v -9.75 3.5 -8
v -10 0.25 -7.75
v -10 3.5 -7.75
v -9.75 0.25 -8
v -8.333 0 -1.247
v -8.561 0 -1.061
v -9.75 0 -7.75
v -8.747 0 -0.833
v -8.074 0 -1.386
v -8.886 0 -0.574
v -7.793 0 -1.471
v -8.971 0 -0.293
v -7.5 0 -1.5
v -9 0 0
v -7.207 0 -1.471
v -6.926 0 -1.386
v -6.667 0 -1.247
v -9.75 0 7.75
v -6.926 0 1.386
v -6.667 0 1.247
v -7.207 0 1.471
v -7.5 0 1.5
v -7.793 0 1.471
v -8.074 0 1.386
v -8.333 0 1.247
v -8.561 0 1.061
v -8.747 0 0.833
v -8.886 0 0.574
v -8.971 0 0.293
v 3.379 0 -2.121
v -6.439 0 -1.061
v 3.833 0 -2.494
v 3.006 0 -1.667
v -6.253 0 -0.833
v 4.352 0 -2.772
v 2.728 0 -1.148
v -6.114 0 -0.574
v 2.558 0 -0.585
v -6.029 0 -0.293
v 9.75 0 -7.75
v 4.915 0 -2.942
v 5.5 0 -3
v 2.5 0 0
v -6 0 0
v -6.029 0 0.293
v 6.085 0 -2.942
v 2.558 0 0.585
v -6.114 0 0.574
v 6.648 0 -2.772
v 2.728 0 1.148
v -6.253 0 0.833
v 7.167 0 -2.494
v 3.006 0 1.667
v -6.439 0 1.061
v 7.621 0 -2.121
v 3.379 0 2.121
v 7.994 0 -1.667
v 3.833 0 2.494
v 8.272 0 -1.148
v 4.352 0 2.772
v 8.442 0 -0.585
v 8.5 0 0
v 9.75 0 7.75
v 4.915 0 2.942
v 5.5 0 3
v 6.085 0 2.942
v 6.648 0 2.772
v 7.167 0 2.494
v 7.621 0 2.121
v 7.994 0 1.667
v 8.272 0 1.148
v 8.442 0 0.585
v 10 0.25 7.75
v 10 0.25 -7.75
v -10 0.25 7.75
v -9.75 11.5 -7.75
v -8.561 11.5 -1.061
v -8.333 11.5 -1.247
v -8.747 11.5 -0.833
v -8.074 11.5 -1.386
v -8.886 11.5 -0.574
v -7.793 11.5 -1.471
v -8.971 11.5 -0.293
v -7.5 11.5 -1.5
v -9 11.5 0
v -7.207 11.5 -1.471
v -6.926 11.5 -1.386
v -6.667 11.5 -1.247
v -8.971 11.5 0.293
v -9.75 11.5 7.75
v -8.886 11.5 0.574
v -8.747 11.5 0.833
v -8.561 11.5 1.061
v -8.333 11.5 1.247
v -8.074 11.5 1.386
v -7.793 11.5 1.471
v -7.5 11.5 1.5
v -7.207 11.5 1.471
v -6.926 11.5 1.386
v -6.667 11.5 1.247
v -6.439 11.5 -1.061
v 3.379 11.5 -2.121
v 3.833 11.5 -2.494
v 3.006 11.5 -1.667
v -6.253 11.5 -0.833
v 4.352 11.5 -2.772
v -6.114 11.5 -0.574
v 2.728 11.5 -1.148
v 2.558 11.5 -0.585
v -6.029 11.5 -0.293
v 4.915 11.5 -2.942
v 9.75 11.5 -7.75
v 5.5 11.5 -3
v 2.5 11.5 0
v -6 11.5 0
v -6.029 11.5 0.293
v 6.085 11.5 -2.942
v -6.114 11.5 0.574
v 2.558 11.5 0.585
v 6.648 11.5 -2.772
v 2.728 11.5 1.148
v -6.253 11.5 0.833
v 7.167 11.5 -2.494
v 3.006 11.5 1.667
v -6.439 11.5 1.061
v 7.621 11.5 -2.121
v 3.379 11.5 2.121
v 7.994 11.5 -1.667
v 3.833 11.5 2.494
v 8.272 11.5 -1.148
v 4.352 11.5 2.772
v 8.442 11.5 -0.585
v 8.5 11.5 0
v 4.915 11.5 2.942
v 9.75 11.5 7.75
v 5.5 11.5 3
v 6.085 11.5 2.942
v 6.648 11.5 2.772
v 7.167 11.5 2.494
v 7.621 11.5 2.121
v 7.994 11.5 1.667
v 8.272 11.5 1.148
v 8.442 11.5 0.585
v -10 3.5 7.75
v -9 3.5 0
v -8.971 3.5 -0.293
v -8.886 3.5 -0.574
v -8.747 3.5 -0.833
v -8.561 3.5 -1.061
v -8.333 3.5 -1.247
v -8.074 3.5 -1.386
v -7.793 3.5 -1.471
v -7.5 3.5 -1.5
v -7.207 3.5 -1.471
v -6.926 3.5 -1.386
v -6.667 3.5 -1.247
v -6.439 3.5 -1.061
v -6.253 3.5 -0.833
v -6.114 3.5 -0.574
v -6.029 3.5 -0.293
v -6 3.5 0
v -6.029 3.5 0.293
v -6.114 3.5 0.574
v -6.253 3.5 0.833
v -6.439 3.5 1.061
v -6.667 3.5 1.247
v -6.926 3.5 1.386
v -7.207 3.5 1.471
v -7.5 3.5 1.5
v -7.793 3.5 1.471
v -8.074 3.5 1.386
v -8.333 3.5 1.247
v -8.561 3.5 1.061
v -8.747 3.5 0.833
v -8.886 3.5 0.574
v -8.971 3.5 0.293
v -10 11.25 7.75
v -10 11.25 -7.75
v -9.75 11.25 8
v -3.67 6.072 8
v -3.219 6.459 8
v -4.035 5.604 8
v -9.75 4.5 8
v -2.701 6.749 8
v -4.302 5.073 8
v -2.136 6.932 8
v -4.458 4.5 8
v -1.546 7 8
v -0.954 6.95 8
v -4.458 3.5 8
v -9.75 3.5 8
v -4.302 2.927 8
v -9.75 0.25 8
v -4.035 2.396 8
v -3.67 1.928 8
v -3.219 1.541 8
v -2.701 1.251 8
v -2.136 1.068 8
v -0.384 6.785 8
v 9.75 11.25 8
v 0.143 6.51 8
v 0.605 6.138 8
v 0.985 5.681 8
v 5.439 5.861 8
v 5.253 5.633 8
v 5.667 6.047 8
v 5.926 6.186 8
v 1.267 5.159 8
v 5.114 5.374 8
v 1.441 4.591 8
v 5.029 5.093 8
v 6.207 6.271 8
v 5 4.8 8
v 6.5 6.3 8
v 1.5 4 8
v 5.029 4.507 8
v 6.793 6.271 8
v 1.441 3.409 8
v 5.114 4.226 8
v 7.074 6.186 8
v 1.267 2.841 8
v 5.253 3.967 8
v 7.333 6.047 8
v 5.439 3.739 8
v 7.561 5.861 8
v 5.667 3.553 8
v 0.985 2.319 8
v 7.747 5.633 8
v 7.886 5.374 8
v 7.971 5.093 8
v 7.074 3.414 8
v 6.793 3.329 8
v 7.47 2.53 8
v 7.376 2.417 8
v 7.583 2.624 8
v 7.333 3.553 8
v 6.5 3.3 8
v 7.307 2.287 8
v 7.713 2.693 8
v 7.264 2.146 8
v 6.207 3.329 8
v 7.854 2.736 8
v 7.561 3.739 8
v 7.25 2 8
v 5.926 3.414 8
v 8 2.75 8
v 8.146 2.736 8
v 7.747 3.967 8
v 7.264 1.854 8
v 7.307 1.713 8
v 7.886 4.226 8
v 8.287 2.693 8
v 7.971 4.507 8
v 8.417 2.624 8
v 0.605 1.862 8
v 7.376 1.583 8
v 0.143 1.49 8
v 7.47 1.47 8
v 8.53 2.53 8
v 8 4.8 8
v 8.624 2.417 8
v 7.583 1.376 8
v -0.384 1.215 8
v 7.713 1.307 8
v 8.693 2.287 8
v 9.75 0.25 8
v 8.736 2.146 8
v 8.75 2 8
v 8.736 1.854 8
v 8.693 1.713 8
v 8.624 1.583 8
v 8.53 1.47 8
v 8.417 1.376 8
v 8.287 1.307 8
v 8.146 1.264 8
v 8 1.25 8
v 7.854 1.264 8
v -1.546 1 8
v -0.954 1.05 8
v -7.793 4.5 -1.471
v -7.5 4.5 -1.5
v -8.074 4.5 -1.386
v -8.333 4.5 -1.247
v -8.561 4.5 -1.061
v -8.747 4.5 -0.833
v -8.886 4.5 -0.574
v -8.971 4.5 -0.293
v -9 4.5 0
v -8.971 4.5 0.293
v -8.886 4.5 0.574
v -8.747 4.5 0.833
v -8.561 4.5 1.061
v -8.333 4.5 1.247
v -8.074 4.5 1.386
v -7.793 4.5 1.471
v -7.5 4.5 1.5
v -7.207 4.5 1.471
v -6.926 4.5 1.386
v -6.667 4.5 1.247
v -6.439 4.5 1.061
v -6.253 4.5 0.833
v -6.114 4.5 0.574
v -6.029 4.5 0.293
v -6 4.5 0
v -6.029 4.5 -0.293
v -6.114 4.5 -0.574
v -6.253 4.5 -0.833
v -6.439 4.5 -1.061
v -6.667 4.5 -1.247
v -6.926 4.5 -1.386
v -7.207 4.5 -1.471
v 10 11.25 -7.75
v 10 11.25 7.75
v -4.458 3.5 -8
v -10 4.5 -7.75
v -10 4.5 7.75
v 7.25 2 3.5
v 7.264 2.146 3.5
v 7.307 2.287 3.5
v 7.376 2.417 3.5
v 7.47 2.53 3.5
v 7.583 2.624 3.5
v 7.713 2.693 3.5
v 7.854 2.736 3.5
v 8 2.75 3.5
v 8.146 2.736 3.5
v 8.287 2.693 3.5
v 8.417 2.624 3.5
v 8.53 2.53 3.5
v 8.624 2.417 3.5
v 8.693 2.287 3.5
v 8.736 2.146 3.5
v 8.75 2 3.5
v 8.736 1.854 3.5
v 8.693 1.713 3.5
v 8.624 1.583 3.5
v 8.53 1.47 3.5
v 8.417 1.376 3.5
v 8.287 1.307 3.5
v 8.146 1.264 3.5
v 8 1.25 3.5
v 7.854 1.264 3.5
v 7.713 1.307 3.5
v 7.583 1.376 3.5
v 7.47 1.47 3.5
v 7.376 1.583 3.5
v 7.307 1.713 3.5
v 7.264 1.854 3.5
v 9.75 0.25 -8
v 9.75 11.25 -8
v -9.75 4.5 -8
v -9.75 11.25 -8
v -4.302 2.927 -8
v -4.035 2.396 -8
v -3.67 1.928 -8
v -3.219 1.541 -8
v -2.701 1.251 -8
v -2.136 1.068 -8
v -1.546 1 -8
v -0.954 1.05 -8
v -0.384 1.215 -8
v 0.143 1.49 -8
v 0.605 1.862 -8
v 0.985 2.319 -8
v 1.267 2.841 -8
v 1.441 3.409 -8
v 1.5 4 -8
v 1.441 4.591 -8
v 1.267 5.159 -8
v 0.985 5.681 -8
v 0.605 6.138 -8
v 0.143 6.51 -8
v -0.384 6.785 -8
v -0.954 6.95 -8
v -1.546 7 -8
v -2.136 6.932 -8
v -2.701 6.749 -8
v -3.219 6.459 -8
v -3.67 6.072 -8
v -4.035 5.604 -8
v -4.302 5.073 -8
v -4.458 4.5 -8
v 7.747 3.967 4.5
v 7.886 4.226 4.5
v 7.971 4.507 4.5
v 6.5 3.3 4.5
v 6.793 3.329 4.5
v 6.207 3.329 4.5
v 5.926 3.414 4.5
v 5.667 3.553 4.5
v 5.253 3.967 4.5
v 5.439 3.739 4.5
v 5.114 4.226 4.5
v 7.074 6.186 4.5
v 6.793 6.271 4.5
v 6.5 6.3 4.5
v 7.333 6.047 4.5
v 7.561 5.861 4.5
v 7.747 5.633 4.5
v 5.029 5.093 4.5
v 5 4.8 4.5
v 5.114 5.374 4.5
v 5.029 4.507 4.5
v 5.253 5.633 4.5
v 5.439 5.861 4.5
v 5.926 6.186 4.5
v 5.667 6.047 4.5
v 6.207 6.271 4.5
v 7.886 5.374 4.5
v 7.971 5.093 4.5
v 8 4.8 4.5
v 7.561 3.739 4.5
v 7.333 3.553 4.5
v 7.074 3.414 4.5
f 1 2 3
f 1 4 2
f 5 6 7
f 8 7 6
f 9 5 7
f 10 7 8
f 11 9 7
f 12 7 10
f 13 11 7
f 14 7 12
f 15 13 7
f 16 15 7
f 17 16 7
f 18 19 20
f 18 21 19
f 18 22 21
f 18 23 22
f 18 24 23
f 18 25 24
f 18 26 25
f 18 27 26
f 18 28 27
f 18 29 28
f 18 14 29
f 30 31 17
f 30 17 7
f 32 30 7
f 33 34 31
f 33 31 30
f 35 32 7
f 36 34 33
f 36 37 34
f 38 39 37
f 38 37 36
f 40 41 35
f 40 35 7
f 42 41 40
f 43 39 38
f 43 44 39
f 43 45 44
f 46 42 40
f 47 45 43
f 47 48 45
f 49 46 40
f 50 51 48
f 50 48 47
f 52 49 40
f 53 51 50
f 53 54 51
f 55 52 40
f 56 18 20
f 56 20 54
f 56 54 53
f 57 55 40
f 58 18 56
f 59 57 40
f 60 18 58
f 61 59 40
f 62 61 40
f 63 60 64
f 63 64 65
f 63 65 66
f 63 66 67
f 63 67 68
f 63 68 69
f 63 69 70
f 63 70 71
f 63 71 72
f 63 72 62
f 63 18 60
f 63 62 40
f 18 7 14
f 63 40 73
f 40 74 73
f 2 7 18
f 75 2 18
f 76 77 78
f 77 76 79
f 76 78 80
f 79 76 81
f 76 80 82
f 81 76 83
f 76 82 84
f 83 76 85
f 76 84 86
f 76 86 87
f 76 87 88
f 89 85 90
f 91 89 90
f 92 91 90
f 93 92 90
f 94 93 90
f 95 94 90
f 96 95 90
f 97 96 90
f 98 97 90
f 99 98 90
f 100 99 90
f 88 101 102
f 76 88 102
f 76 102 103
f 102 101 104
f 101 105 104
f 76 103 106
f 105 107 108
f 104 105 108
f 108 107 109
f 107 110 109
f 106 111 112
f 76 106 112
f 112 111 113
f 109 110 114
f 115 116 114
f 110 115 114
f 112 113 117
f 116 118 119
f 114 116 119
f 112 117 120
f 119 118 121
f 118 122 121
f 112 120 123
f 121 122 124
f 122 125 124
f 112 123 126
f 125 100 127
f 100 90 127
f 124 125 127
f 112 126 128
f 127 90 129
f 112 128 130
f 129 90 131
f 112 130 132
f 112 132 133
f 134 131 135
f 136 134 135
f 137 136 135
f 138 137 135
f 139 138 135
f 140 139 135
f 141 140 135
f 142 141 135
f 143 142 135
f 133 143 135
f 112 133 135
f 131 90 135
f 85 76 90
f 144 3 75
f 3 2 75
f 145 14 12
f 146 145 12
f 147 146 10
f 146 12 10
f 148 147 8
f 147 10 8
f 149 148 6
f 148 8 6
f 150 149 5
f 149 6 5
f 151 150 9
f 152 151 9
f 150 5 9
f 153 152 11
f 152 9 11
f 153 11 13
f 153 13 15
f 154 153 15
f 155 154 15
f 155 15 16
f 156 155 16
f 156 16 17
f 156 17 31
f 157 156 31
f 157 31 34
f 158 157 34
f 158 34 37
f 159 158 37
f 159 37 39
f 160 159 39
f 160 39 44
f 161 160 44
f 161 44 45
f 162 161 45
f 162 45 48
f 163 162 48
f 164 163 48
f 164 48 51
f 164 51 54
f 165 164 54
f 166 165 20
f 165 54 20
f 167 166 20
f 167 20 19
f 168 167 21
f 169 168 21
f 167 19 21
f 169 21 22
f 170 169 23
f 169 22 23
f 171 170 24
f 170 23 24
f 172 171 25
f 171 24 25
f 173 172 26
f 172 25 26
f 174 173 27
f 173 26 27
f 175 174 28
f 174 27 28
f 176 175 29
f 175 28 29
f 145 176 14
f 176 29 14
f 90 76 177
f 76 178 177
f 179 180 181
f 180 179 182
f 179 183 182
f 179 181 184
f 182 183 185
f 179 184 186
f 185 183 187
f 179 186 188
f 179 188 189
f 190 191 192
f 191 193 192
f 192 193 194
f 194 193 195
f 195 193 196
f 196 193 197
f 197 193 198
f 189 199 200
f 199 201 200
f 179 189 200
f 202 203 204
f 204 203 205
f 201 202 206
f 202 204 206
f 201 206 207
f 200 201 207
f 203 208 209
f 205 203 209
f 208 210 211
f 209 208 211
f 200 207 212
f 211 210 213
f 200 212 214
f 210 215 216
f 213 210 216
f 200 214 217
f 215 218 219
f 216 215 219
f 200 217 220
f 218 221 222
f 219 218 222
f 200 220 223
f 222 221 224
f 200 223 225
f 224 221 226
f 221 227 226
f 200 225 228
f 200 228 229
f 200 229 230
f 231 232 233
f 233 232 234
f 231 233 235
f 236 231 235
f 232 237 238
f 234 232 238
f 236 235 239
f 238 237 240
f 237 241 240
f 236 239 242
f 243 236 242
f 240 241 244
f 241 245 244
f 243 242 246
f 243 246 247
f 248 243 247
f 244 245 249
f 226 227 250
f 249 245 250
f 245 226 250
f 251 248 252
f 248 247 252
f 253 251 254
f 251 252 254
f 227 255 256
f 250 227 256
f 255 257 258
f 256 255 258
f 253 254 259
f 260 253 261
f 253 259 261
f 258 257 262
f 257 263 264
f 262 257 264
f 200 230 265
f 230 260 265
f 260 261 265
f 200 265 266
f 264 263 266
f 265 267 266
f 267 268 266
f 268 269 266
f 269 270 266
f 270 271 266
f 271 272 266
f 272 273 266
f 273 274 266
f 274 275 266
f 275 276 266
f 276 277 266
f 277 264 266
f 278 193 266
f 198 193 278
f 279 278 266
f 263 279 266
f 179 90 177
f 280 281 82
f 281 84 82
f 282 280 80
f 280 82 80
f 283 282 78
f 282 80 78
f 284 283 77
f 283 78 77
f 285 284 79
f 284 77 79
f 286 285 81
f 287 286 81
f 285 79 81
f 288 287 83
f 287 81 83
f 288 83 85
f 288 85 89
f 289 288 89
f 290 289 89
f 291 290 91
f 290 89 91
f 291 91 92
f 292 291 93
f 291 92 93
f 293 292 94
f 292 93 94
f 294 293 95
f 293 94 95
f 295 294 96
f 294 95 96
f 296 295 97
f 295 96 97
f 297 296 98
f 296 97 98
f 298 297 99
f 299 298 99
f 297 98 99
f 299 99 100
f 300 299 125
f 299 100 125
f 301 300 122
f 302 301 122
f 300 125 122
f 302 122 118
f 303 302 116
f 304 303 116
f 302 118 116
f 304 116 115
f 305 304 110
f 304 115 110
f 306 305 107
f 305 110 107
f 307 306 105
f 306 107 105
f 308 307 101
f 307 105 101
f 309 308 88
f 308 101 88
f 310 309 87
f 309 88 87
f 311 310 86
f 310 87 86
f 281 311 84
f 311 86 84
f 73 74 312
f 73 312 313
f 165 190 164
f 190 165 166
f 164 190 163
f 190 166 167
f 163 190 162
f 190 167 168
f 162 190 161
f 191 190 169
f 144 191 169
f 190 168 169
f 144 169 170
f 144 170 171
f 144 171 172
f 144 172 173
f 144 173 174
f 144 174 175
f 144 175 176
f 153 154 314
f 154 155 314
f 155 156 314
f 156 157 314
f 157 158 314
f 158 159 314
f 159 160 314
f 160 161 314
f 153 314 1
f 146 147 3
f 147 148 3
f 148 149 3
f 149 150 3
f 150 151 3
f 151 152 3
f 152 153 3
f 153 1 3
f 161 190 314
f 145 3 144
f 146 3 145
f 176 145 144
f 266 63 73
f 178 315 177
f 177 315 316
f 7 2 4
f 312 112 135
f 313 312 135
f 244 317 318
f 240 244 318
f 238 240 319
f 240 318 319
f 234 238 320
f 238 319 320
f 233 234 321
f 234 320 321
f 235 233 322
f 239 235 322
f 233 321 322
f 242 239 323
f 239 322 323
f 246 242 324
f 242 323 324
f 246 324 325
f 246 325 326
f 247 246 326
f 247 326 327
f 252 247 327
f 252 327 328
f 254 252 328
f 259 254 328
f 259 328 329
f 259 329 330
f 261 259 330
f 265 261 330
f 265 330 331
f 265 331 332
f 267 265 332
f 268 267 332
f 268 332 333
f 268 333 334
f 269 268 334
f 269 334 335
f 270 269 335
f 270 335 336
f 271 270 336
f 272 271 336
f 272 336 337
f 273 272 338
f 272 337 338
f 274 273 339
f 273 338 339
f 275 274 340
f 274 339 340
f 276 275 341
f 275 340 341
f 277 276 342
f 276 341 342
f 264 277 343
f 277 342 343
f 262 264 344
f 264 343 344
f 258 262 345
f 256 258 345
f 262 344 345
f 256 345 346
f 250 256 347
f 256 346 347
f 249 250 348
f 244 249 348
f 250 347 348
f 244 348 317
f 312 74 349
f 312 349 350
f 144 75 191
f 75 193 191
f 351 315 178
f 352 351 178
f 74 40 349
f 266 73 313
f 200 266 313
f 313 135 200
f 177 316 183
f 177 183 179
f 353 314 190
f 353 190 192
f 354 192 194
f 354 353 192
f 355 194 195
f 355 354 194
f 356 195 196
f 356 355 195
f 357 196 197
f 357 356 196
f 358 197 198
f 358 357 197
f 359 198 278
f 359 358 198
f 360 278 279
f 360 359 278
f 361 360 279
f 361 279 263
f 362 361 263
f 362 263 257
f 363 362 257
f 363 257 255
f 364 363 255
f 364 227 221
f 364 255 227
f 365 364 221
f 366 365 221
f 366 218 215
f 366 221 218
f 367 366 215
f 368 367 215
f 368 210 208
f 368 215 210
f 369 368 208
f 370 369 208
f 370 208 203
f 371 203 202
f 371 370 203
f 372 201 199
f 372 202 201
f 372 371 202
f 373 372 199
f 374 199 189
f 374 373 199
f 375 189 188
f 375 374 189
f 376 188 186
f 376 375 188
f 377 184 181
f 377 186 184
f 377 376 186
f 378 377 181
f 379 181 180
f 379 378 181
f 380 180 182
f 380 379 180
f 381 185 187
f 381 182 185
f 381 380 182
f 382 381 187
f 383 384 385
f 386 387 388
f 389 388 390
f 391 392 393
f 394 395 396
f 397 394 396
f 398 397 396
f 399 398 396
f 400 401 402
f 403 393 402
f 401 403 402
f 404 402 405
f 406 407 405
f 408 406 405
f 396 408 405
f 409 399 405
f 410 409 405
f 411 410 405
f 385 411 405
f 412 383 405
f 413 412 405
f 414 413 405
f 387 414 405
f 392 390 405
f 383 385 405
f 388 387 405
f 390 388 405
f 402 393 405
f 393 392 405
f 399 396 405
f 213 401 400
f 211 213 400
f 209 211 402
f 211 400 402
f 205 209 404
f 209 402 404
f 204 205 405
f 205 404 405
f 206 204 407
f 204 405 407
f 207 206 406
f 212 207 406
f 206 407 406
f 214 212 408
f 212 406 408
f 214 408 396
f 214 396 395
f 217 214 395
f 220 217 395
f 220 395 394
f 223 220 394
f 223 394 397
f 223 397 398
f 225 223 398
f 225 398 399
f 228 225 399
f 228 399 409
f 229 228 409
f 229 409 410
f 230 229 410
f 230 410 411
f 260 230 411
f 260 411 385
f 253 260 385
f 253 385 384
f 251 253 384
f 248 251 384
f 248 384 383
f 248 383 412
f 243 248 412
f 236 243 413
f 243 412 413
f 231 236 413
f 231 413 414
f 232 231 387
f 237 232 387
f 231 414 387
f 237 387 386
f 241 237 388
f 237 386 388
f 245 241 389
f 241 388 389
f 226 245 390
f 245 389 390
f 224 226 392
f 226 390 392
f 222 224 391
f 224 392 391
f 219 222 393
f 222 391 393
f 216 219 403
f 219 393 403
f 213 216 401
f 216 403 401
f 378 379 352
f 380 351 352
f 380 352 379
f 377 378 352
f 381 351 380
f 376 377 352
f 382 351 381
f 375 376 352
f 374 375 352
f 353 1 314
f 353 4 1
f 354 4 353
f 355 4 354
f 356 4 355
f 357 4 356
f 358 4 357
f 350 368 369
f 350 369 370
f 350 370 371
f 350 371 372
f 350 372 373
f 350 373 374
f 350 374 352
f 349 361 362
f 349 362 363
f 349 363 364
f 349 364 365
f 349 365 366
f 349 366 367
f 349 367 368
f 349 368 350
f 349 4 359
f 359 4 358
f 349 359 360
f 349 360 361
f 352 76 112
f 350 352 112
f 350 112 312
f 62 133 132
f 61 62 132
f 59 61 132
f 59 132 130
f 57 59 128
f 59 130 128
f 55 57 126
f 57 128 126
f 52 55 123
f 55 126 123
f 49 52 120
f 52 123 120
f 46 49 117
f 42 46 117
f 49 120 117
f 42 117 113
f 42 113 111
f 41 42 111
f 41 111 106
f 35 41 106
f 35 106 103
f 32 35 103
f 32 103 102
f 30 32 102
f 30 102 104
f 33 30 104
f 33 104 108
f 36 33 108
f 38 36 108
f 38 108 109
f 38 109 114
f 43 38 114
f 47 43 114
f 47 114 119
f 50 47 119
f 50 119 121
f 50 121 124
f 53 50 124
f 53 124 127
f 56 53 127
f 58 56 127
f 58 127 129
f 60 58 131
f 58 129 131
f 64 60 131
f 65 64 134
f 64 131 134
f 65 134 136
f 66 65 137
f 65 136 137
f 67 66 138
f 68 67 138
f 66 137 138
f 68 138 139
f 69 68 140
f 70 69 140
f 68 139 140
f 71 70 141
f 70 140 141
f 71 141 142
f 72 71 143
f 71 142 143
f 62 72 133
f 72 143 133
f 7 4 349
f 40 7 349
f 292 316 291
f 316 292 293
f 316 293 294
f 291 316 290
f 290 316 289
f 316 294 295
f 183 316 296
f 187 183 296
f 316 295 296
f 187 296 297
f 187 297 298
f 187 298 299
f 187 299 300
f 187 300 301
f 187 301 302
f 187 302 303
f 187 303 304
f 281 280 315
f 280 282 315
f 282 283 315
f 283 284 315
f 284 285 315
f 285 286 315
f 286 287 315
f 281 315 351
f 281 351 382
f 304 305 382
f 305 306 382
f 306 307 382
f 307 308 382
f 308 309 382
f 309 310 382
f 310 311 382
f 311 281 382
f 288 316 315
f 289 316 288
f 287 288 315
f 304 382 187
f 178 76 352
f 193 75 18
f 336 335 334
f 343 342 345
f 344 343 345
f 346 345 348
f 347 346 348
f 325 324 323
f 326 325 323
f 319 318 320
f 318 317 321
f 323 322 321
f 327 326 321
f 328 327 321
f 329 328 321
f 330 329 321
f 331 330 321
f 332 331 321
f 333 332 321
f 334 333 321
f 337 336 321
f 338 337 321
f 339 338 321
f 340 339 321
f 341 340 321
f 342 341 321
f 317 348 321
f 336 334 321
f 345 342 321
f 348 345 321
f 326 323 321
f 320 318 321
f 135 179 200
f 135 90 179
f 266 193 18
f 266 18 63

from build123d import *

# Parameters (mm, degrees)
SKETCH1_W                      = 20
SKETCH1_H                      = 16
BOSS_EXTRUDE1_DEPTH            = 11.5
CUT_EXTRUDE1_DEPTH             = 17
SKETCH3_W                      = 3
SKETCH3_H                      = 16
SKETCH4_W                      = 1.5
SKETCH4_H                      = 7
F_6_0_6_DIAMETER_HOLE1_D       = 6
F_6_0_6_DIAMETER_HOLE1_DEPTH   = 11.5
F_3_0_3_DIAMETER_HOLE2_D       = 3
F_3_0_3_DIAMETER_HOLE2_DEPTH   = 3.5
F_3_0_3_DIAMETER_HOLE3_D       = 3
F_3_0_3_DIAMETER_HOLE3_DEPTH   = 3.5
F_1_5_1_5_DIAMETER_HOLE1_D     = 1.5
F_1_5_1_5_DIAMETER_HOLE1_DEPTH = 4.5
CHAMFER1_SIZE                  = 0.25


with BuildPart() as part:
    # Sketch1 → Boss-Extrude1 (new body)
    with BuildSketch(Plane.XZ):
        Rectangle(SKETCH1_W, SKETCH1_H)
    extrude(amount=-BOSS_EXTRUDE1_DEPTH)

    # Sketch2 → Cut-Extrude1 (cut, through all)
    with BuildSketch(Plane(origin=(0, 0, -8), x_dir=(-1, 0, 0), z_dir=(0, 0, -1))):
        with BuildLine():
            Line((10, 3.5), (10, 4.5))
            Line((10, 4.5), (4.458039892, 4.5))
            ThreePointArc((4.458039892, 4.5), (4.5, 4), (4.458039892, 3.5))
            Line((4.458039892, 3.5), (10, 3.5))
        make_face()
    extrude(amount=-CUT_EXTRUDE1_DEPTH, mode=Mode.SUBTRACT)

    # Sketch3 → Cut-Revolve1 (revolve, cut)
    with BuildSketch(Plane(origin=(0, 4, 0), x_dir=(1, 0, 0), z_dir=(0, 1, 0))):
        Rectangle(SKETCH3_W, SKETCH3_H)
    revolve(axis=Axis((-1.5, 4, -8), (0, 0, 1)), mode=Mode.SUBTRACT)

    # Sketch4 → Ø3.0 (3) Diameter Hole1 (revolve, cut)
    with BuildSketch(Plane(origin=(-7.5, 4.5, 0), x_dir=(0, 0, -1), z_dir=(1, 0, 0))):
        with Locations((0.75, 3.5)):
            Rectangle(SKETCH4_W, SKETCH4_H)
    revolve(axis=Axis((-7.5, -1.85, 0), (0, 1, 0)), mode=Mode.SUBTRACT)

    # Ø6.0 (6) Diameter Hole1
    with Locations(Plane(origin=(0, 0, 0), x_dir=(-1, 0, 0), z_dir=(0, -1, 0))):
        with Locations((-5.5, 0)):
            Hole(F_6_0_6_DIAMETER_HOLE1_D / 2, depth=F_6_0_6_DIAMETER_HOLE1_DEPTH)

    # Ø3.0 (3) Diameter Hole2
    with Locations(Plane(origin=(0, 3.5, 0), x_dir=(1, 0, 0), z_dir=(0, 1, 0))):
        with Locations((-7.5, 0)):
            Hole(F_3_0_3_DIAMETER_HOLE2_D / 2, depth=F_3_0_3_DIAMETER_HOLE2_DEPTH)

    # Ø3.0 (3) Diameter Hole3
    with Locations(Plane.XY.offset(8)):
        with Locations((6.5, 4.8)):
            Hole(F_3_0_3_DIAMETER_HOLE3_D / 2, depth=F_3_0_3_DIAMETER_HOLE3_DEPTH)

    # Ø1.5 (1.5) Diameter Hole1
    with Locations(Plane.XY.offset(8)):
        with Locations((8, 2)):
            Hole(F_1_5_1_5_DIAMETER_HOLE1_D / 2, depth=F_1_5_1_5_DIAMETER_HOLE1_DEPTH)

    # Chamfer1
    chamfer1_edges = [part.edges().sort_by_distance(p)[0] for p in [
        (0, 11.5, 8),
        (-10, 11.5, 0),
        (-10, 1.75, 8),
        (-10, 1.75, -8),
        (0, 11.5, -8),
        (-10, 0, 0),
        (0, 0, 8),
        (10, 0, 0),
        (0, 0, -8),
        (10, 11.5, 0),
        (-10, 8, -8),
        (-10, 8, 8),
        (10, 5.75, 8),
        (10, 5.75, -8),
    ]]
    chamfer(chamfer1_edges, length=CHAMFER1_SIZE)


solid = part.part
